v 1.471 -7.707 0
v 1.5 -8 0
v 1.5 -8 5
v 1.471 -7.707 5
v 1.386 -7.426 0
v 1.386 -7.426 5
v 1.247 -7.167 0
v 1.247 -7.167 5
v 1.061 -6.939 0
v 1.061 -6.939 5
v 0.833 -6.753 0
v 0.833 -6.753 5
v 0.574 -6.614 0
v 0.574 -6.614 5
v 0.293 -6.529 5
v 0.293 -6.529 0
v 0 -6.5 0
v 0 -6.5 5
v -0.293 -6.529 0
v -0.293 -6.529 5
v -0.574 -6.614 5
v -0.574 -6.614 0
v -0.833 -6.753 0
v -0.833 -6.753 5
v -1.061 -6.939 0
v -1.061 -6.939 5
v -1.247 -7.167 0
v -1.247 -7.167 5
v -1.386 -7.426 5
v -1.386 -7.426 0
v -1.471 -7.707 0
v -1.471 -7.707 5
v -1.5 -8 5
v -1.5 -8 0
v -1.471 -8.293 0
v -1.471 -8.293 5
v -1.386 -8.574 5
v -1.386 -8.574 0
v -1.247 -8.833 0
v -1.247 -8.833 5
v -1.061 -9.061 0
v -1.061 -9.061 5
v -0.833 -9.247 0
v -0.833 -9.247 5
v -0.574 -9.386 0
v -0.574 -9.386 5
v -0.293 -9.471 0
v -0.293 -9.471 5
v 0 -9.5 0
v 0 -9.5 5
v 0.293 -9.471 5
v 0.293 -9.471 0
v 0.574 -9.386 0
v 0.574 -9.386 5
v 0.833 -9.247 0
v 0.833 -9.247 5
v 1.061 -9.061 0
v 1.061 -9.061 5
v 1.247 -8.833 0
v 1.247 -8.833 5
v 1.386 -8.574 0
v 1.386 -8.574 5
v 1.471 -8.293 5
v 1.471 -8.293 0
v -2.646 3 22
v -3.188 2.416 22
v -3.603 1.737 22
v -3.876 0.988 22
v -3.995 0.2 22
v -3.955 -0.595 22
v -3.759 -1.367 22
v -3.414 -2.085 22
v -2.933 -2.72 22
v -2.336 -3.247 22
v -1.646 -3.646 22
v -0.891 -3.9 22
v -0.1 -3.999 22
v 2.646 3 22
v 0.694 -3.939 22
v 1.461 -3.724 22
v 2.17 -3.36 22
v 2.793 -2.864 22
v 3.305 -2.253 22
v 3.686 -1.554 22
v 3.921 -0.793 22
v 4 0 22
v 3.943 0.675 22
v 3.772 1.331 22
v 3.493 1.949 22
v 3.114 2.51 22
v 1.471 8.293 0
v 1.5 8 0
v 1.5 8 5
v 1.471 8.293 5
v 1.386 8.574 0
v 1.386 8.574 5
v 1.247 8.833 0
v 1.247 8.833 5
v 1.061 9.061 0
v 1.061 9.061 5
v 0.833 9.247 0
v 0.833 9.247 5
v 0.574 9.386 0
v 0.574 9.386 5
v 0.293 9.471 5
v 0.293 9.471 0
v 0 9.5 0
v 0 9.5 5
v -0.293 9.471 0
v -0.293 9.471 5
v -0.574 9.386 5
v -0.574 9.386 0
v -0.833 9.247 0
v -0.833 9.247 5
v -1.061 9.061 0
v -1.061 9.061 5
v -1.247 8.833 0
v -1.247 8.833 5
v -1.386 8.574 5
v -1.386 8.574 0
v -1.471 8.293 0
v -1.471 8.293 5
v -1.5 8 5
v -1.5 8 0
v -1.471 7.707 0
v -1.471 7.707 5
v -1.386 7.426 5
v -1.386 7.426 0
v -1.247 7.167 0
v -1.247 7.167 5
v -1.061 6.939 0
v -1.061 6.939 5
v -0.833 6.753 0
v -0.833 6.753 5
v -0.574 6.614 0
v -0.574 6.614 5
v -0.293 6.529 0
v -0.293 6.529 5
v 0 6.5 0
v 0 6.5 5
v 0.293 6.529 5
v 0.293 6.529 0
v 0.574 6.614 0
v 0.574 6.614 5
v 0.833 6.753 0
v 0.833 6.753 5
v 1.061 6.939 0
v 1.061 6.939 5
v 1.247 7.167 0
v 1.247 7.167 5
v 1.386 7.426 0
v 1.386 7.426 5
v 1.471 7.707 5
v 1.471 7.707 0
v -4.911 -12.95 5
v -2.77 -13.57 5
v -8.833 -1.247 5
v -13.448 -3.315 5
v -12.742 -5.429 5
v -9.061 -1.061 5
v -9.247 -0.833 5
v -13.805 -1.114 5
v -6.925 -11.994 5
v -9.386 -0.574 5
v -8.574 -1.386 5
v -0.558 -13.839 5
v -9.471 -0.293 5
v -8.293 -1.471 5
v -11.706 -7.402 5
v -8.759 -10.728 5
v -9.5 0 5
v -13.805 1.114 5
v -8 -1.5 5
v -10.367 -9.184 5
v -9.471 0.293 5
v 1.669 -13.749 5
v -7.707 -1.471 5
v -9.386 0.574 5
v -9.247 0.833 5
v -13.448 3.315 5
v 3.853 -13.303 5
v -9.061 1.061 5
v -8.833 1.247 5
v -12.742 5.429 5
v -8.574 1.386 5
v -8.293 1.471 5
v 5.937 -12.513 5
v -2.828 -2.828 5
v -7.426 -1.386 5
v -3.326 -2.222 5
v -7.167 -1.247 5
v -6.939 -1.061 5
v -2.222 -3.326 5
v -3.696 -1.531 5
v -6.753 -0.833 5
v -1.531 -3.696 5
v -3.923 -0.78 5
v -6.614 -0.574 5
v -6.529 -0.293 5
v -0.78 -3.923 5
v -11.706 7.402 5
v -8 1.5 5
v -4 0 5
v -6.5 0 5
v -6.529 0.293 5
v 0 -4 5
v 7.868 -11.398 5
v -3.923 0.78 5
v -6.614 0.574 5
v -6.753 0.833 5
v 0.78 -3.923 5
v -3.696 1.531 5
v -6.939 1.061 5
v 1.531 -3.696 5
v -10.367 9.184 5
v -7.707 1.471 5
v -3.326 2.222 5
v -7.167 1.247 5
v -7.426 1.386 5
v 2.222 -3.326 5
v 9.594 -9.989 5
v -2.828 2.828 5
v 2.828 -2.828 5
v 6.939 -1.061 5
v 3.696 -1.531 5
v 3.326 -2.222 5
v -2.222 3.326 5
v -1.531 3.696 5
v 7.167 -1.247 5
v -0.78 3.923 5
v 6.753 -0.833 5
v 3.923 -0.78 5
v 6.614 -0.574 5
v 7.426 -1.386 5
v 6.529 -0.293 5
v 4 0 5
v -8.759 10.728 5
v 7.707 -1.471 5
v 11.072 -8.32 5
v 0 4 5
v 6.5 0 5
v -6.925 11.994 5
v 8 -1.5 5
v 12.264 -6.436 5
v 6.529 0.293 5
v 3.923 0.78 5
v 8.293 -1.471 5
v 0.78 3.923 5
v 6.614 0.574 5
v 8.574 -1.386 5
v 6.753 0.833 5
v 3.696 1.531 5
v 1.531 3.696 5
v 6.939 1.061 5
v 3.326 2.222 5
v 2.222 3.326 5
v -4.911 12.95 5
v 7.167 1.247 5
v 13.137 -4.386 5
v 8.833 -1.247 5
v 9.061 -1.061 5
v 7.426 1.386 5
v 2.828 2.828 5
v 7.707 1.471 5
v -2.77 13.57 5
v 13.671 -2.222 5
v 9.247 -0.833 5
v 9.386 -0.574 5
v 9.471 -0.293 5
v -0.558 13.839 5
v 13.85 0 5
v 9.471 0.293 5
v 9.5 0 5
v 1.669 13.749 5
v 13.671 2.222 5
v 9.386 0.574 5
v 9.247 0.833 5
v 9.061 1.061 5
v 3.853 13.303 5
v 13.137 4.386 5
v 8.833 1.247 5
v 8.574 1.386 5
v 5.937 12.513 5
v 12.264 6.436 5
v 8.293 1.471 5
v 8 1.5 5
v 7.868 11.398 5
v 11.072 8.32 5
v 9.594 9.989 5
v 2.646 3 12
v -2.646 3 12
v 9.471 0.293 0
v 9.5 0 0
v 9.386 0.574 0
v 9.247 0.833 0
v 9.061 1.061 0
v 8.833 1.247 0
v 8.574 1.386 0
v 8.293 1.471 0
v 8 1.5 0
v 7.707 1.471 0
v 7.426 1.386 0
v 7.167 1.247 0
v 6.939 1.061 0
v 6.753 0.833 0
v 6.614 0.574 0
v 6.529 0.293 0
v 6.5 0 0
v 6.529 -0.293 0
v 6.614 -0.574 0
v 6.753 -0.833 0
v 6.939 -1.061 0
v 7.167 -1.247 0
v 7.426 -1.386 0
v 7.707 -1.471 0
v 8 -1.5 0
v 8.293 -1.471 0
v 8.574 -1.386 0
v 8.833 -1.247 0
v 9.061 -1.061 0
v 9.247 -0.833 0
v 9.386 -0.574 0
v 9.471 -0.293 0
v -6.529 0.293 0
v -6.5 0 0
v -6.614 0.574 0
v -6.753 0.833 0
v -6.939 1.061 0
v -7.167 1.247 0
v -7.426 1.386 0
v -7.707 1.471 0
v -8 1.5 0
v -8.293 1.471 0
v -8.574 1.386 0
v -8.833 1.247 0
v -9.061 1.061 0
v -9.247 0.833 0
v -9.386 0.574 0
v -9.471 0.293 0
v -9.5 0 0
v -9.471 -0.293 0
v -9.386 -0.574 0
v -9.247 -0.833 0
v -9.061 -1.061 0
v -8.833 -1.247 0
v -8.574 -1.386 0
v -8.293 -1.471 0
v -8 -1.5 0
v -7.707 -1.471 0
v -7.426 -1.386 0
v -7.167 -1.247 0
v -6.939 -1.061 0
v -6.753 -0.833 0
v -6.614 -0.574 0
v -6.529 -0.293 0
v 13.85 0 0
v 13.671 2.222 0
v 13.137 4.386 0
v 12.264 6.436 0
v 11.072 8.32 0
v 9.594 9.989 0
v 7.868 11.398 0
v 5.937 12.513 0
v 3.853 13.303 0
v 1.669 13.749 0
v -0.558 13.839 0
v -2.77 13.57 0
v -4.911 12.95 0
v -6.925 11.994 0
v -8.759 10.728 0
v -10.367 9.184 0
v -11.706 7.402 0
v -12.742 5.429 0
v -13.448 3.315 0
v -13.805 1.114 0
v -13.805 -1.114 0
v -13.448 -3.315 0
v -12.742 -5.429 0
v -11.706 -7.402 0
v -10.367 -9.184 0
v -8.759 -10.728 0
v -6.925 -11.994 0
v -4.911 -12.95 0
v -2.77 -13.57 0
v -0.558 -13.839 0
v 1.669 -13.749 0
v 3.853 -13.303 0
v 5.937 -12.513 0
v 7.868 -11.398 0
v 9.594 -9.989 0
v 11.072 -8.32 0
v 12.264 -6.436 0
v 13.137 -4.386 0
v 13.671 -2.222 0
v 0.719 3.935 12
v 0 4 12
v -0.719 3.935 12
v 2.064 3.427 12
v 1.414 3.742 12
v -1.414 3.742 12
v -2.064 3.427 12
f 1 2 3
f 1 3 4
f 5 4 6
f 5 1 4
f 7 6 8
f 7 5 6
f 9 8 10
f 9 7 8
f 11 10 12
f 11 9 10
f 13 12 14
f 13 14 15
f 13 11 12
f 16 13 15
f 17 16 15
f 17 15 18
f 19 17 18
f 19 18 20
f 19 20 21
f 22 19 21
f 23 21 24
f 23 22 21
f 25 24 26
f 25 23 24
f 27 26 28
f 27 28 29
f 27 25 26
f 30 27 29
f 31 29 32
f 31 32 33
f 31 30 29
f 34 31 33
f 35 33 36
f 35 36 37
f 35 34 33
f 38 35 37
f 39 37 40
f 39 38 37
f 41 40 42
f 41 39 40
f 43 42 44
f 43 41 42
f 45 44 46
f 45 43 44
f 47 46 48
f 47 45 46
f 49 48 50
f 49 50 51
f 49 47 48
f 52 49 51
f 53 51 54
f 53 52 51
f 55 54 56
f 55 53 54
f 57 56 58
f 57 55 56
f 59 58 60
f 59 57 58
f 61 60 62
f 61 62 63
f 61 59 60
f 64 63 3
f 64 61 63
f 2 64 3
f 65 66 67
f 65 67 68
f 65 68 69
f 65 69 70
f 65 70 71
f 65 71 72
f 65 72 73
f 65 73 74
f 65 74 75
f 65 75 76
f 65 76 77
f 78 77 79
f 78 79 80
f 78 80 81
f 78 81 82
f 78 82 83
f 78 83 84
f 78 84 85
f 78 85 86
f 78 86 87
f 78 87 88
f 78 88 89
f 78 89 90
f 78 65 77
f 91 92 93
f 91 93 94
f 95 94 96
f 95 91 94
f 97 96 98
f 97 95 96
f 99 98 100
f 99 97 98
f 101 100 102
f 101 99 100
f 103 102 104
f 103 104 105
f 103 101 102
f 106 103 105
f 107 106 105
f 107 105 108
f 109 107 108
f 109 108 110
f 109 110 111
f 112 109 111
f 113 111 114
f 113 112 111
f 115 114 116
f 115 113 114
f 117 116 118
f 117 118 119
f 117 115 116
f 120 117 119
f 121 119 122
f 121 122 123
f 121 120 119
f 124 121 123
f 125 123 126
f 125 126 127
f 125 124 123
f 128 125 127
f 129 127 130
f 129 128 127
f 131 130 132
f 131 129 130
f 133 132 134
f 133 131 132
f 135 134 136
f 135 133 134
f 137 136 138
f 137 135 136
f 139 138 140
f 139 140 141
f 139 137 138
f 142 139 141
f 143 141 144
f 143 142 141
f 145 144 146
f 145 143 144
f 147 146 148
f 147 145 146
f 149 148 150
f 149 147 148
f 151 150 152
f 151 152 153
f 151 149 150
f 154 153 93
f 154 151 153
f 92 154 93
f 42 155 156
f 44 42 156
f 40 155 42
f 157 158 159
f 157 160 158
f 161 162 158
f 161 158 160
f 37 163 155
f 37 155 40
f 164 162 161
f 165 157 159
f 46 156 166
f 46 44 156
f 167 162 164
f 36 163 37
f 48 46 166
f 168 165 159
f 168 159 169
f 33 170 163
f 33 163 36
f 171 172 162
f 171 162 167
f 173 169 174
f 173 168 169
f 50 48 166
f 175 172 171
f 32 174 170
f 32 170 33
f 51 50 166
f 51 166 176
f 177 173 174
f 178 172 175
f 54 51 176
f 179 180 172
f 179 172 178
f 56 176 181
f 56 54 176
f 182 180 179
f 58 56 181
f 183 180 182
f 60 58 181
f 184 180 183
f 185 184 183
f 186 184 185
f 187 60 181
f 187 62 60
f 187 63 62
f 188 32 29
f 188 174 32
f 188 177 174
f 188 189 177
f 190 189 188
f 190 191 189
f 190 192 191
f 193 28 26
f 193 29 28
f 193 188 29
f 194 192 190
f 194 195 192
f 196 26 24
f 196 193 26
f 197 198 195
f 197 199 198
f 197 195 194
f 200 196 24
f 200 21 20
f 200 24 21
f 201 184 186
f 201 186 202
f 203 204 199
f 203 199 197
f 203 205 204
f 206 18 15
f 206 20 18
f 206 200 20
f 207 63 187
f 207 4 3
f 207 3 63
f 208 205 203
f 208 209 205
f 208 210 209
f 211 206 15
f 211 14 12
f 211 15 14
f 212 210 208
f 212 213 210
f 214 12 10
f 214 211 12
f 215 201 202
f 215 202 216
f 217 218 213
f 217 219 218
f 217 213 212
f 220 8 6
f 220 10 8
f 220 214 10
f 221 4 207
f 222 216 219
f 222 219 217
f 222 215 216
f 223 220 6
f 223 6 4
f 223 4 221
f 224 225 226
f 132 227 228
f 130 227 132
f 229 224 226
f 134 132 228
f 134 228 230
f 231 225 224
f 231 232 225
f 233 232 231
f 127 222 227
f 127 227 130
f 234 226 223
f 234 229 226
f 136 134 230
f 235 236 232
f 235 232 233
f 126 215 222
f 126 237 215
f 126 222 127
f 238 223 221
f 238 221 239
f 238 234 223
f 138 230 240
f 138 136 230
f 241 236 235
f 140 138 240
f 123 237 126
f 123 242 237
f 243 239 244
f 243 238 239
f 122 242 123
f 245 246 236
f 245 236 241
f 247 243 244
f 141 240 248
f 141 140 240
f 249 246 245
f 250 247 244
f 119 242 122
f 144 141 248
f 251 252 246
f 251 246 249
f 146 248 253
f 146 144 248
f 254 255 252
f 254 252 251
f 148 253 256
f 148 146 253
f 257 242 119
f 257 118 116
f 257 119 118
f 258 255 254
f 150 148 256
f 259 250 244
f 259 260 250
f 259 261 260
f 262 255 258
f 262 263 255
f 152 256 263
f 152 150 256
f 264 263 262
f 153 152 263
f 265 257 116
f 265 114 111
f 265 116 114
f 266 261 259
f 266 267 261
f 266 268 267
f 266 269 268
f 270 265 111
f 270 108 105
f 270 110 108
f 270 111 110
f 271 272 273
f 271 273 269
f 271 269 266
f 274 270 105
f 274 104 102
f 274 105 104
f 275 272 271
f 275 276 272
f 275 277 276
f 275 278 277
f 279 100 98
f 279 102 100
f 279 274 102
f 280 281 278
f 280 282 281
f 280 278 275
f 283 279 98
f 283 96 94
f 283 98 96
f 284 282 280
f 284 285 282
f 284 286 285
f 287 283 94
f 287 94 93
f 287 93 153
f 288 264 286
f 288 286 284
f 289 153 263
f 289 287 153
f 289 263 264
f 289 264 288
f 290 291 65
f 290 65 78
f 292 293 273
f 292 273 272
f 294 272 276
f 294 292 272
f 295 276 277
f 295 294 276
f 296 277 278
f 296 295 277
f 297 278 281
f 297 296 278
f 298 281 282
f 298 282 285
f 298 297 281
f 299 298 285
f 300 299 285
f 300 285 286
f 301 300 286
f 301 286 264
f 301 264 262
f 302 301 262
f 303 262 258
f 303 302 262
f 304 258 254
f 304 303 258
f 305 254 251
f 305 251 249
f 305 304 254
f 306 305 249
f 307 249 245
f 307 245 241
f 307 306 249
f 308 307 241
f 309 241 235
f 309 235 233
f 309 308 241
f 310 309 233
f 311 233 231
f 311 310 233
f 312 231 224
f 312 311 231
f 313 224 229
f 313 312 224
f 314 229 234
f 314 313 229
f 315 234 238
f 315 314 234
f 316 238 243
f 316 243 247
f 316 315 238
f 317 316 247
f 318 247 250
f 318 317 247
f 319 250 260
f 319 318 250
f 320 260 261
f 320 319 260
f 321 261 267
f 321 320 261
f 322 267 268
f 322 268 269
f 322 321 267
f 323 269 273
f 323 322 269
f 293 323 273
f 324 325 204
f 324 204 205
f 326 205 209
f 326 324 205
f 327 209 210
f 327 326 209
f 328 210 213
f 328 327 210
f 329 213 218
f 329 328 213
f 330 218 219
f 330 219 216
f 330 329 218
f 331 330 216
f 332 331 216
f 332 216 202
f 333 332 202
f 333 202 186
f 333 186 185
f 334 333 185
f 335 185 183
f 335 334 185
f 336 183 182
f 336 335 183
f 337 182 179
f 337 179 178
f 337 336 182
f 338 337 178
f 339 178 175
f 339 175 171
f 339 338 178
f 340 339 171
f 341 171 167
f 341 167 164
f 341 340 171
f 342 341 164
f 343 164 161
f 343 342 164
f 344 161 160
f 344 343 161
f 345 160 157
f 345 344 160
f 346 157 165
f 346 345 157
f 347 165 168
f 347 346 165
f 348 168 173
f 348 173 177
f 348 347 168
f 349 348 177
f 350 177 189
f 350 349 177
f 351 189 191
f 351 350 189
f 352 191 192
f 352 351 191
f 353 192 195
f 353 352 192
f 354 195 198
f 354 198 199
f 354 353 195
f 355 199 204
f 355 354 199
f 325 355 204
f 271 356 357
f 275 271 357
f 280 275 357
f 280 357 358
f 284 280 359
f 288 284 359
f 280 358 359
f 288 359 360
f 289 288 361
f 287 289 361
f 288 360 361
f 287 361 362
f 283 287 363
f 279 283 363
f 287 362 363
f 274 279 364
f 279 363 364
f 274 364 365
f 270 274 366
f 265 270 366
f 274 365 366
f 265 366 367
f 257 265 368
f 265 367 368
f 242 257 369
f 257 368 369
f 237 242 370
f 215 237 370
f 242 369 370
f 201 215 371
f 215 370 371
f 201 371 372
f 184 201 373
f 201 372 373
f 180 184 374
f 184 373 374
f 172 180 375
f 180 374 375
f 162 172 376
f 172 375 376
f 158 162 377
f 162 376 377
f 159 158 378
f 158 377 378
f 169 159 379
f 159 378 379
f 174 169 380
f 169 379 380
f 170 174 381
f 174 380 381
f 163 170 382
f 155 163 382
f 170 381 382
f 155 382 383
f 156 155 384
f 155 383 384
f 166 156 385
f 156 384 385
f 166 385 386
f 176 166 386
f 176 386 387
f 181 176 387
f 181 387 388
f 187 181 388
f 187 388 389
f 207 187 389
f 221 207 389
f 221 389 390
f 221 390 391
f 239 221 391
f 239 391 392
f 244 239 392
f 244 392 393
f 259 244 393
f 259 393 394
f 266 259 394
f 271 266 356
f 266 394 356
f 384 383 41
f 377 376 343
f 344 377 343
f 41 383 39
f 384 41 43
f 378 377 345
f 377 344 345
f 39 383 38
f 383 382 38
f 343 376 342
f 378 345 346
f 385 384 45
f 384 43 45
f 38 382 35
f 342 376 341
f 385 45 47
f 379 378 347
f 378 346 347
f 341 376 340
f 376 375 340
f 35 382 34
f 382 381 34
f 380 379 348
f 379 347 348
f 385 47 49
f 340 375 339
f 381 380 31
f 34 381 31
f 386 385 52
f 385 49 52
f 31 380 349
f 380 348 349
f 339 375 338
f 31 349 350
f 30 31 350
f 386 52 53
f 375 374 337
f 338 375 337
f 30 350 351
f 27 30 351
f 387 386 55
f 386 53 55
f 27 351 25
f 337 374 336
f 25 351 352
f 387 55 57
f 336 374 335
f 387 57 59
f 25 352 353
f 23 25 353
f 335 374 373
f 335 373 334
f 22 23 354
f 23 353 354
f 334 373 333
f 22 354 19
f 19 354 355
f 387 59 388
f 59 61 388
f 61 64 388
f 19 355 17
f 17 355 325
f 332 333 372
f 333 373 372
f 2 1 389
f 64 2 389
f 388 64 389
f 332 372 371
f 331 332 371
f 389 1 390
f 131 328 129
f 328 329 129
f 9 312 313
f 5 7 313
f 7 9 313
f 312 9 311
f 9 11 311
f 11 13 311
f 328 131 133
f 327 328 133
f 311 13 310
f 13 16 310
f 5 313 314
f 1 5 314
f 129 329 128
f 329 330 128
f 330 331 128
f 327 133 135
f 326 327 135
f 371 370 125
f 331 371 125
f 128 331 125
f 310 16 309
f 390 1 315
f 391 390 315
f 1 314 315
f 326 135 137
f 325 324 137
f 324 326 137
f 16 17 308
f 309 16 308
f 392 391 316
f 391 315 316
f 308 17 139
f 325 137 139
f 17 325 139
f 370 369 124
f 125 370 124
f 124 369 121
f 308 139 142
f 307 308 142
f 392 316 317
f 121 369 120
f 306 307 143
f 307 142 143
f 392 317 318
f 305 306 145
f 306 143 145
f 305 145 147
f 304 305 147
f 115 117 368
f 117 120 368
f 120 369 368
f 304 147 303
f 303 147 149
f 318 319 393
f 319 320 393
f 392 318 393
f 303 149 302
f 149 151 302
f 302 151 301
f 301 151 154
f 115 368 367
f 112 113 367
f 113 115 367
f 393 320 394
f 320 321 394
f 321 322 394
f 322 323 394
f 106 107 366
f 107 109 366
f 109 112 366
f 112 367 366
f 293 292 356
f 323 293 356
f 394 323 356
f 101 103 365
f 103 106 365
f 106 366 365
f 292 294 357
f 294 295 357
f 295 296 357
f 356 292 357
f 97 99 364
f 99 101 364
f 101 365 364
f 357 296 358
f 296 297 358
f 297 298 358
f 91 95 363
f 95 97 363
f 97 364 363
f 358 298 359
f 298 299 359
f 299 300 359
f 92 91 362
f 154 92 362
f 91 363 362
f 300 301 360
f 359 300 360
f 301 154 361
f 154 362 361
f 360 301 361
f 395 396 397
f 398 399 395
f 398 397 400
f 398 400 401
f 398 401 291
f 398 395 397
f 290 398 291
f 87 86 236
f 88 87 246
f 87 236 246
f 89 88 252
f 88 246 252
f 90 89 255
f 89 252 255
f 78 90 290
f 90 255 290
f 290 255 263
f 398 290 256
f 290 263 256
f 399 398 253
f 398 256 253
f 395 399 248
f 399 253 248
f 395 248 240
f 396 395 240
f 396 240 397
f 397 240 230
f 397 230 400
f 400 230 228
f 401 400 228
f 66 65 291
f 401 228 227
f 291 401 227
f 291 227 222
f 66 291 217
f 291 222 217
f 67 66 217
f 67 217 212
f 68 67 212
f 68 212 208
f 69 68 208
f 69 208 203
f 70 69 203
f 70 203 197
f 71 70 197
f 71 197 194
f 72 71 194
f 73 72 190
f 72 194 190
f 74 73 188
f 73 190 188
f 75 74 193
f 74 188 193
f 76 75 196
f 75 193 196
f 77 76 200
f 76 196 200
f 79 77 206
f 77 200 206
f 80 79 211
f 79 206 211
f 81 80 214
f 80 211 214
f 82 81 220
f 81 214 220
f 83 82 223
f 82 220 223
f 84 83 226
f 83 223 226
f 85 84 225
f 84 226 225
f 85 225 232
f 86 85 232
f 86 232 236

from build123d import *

# Parameters (mm, degrees)
SKETCH2_R                = 13.85
SKETCH2_R_2              = 4
SKETCH2_R_3              = 1.5
BOSS_EXTRUDE1_DEPTH      = 5
SKETCH3_R                = 4
BOSS_EXTRUDE2_DEPTH      = 17
BOSS_EXTRUDE2_DEPTH_BACK = 5
CUT_EXTRUDE1_DEPTH       = 10


with BuildPart() as part:
    # Sketch2 → Boss-Extrude1 (new body)
    with BuildSketch(Plane.XY):
        Circle(SKETCH2_R)
        Circle(SKETCH2_R_2, mode=Mode.SUBTRACT)
        with Locations((0, 8)):
            Circle(SKETCH2_R_3, mode=Mode.SUBTRACT)
        with Locations((-8, 0)):
            Circle(SKETCH2_R_3, mode=Mode.SUBTRACT)
        with Locations((8, 0)):
            Circle(SKETCH2_R_3, mode=Mode.SUBTRACT)
        with Locations((0, -8)):
            Circle(SKETCH2_R_3, mode=Mode.SUBTRACT)
    extrude(amount=BOSS_EXTRUDE1_DEPTH)

    # Sketch3 → Boss-Extrude2 (add, two sides)
    with BuildSketch(Plane.XY.offset(5)) as boss_extrude2_sk:
        Circle(SKETCH3_R)
    extrude(amount=BOSS_EXTRUDE2_DEPTH)
    extrude(boss_extrude2_sk.sketch, amount=-BOSS_EXTRUDE2_DEPTH_BACK)

    # Sketch4 → Cut-Extrude1 (cut)
    with BuildSketch(Plane.XY.offset(22)):
        with BuildLine():
            Line((-2.645751311, 3), (2.645751311, 3))
            ThreePointArc((2.645751311, 3), (0, 4), (-2.645751311, 3))
        make_face()
    extrude(amount=-CUT_EXTRUDE1_DEPTH, mode=Mode.SUBTRACT)


solid = part.part
